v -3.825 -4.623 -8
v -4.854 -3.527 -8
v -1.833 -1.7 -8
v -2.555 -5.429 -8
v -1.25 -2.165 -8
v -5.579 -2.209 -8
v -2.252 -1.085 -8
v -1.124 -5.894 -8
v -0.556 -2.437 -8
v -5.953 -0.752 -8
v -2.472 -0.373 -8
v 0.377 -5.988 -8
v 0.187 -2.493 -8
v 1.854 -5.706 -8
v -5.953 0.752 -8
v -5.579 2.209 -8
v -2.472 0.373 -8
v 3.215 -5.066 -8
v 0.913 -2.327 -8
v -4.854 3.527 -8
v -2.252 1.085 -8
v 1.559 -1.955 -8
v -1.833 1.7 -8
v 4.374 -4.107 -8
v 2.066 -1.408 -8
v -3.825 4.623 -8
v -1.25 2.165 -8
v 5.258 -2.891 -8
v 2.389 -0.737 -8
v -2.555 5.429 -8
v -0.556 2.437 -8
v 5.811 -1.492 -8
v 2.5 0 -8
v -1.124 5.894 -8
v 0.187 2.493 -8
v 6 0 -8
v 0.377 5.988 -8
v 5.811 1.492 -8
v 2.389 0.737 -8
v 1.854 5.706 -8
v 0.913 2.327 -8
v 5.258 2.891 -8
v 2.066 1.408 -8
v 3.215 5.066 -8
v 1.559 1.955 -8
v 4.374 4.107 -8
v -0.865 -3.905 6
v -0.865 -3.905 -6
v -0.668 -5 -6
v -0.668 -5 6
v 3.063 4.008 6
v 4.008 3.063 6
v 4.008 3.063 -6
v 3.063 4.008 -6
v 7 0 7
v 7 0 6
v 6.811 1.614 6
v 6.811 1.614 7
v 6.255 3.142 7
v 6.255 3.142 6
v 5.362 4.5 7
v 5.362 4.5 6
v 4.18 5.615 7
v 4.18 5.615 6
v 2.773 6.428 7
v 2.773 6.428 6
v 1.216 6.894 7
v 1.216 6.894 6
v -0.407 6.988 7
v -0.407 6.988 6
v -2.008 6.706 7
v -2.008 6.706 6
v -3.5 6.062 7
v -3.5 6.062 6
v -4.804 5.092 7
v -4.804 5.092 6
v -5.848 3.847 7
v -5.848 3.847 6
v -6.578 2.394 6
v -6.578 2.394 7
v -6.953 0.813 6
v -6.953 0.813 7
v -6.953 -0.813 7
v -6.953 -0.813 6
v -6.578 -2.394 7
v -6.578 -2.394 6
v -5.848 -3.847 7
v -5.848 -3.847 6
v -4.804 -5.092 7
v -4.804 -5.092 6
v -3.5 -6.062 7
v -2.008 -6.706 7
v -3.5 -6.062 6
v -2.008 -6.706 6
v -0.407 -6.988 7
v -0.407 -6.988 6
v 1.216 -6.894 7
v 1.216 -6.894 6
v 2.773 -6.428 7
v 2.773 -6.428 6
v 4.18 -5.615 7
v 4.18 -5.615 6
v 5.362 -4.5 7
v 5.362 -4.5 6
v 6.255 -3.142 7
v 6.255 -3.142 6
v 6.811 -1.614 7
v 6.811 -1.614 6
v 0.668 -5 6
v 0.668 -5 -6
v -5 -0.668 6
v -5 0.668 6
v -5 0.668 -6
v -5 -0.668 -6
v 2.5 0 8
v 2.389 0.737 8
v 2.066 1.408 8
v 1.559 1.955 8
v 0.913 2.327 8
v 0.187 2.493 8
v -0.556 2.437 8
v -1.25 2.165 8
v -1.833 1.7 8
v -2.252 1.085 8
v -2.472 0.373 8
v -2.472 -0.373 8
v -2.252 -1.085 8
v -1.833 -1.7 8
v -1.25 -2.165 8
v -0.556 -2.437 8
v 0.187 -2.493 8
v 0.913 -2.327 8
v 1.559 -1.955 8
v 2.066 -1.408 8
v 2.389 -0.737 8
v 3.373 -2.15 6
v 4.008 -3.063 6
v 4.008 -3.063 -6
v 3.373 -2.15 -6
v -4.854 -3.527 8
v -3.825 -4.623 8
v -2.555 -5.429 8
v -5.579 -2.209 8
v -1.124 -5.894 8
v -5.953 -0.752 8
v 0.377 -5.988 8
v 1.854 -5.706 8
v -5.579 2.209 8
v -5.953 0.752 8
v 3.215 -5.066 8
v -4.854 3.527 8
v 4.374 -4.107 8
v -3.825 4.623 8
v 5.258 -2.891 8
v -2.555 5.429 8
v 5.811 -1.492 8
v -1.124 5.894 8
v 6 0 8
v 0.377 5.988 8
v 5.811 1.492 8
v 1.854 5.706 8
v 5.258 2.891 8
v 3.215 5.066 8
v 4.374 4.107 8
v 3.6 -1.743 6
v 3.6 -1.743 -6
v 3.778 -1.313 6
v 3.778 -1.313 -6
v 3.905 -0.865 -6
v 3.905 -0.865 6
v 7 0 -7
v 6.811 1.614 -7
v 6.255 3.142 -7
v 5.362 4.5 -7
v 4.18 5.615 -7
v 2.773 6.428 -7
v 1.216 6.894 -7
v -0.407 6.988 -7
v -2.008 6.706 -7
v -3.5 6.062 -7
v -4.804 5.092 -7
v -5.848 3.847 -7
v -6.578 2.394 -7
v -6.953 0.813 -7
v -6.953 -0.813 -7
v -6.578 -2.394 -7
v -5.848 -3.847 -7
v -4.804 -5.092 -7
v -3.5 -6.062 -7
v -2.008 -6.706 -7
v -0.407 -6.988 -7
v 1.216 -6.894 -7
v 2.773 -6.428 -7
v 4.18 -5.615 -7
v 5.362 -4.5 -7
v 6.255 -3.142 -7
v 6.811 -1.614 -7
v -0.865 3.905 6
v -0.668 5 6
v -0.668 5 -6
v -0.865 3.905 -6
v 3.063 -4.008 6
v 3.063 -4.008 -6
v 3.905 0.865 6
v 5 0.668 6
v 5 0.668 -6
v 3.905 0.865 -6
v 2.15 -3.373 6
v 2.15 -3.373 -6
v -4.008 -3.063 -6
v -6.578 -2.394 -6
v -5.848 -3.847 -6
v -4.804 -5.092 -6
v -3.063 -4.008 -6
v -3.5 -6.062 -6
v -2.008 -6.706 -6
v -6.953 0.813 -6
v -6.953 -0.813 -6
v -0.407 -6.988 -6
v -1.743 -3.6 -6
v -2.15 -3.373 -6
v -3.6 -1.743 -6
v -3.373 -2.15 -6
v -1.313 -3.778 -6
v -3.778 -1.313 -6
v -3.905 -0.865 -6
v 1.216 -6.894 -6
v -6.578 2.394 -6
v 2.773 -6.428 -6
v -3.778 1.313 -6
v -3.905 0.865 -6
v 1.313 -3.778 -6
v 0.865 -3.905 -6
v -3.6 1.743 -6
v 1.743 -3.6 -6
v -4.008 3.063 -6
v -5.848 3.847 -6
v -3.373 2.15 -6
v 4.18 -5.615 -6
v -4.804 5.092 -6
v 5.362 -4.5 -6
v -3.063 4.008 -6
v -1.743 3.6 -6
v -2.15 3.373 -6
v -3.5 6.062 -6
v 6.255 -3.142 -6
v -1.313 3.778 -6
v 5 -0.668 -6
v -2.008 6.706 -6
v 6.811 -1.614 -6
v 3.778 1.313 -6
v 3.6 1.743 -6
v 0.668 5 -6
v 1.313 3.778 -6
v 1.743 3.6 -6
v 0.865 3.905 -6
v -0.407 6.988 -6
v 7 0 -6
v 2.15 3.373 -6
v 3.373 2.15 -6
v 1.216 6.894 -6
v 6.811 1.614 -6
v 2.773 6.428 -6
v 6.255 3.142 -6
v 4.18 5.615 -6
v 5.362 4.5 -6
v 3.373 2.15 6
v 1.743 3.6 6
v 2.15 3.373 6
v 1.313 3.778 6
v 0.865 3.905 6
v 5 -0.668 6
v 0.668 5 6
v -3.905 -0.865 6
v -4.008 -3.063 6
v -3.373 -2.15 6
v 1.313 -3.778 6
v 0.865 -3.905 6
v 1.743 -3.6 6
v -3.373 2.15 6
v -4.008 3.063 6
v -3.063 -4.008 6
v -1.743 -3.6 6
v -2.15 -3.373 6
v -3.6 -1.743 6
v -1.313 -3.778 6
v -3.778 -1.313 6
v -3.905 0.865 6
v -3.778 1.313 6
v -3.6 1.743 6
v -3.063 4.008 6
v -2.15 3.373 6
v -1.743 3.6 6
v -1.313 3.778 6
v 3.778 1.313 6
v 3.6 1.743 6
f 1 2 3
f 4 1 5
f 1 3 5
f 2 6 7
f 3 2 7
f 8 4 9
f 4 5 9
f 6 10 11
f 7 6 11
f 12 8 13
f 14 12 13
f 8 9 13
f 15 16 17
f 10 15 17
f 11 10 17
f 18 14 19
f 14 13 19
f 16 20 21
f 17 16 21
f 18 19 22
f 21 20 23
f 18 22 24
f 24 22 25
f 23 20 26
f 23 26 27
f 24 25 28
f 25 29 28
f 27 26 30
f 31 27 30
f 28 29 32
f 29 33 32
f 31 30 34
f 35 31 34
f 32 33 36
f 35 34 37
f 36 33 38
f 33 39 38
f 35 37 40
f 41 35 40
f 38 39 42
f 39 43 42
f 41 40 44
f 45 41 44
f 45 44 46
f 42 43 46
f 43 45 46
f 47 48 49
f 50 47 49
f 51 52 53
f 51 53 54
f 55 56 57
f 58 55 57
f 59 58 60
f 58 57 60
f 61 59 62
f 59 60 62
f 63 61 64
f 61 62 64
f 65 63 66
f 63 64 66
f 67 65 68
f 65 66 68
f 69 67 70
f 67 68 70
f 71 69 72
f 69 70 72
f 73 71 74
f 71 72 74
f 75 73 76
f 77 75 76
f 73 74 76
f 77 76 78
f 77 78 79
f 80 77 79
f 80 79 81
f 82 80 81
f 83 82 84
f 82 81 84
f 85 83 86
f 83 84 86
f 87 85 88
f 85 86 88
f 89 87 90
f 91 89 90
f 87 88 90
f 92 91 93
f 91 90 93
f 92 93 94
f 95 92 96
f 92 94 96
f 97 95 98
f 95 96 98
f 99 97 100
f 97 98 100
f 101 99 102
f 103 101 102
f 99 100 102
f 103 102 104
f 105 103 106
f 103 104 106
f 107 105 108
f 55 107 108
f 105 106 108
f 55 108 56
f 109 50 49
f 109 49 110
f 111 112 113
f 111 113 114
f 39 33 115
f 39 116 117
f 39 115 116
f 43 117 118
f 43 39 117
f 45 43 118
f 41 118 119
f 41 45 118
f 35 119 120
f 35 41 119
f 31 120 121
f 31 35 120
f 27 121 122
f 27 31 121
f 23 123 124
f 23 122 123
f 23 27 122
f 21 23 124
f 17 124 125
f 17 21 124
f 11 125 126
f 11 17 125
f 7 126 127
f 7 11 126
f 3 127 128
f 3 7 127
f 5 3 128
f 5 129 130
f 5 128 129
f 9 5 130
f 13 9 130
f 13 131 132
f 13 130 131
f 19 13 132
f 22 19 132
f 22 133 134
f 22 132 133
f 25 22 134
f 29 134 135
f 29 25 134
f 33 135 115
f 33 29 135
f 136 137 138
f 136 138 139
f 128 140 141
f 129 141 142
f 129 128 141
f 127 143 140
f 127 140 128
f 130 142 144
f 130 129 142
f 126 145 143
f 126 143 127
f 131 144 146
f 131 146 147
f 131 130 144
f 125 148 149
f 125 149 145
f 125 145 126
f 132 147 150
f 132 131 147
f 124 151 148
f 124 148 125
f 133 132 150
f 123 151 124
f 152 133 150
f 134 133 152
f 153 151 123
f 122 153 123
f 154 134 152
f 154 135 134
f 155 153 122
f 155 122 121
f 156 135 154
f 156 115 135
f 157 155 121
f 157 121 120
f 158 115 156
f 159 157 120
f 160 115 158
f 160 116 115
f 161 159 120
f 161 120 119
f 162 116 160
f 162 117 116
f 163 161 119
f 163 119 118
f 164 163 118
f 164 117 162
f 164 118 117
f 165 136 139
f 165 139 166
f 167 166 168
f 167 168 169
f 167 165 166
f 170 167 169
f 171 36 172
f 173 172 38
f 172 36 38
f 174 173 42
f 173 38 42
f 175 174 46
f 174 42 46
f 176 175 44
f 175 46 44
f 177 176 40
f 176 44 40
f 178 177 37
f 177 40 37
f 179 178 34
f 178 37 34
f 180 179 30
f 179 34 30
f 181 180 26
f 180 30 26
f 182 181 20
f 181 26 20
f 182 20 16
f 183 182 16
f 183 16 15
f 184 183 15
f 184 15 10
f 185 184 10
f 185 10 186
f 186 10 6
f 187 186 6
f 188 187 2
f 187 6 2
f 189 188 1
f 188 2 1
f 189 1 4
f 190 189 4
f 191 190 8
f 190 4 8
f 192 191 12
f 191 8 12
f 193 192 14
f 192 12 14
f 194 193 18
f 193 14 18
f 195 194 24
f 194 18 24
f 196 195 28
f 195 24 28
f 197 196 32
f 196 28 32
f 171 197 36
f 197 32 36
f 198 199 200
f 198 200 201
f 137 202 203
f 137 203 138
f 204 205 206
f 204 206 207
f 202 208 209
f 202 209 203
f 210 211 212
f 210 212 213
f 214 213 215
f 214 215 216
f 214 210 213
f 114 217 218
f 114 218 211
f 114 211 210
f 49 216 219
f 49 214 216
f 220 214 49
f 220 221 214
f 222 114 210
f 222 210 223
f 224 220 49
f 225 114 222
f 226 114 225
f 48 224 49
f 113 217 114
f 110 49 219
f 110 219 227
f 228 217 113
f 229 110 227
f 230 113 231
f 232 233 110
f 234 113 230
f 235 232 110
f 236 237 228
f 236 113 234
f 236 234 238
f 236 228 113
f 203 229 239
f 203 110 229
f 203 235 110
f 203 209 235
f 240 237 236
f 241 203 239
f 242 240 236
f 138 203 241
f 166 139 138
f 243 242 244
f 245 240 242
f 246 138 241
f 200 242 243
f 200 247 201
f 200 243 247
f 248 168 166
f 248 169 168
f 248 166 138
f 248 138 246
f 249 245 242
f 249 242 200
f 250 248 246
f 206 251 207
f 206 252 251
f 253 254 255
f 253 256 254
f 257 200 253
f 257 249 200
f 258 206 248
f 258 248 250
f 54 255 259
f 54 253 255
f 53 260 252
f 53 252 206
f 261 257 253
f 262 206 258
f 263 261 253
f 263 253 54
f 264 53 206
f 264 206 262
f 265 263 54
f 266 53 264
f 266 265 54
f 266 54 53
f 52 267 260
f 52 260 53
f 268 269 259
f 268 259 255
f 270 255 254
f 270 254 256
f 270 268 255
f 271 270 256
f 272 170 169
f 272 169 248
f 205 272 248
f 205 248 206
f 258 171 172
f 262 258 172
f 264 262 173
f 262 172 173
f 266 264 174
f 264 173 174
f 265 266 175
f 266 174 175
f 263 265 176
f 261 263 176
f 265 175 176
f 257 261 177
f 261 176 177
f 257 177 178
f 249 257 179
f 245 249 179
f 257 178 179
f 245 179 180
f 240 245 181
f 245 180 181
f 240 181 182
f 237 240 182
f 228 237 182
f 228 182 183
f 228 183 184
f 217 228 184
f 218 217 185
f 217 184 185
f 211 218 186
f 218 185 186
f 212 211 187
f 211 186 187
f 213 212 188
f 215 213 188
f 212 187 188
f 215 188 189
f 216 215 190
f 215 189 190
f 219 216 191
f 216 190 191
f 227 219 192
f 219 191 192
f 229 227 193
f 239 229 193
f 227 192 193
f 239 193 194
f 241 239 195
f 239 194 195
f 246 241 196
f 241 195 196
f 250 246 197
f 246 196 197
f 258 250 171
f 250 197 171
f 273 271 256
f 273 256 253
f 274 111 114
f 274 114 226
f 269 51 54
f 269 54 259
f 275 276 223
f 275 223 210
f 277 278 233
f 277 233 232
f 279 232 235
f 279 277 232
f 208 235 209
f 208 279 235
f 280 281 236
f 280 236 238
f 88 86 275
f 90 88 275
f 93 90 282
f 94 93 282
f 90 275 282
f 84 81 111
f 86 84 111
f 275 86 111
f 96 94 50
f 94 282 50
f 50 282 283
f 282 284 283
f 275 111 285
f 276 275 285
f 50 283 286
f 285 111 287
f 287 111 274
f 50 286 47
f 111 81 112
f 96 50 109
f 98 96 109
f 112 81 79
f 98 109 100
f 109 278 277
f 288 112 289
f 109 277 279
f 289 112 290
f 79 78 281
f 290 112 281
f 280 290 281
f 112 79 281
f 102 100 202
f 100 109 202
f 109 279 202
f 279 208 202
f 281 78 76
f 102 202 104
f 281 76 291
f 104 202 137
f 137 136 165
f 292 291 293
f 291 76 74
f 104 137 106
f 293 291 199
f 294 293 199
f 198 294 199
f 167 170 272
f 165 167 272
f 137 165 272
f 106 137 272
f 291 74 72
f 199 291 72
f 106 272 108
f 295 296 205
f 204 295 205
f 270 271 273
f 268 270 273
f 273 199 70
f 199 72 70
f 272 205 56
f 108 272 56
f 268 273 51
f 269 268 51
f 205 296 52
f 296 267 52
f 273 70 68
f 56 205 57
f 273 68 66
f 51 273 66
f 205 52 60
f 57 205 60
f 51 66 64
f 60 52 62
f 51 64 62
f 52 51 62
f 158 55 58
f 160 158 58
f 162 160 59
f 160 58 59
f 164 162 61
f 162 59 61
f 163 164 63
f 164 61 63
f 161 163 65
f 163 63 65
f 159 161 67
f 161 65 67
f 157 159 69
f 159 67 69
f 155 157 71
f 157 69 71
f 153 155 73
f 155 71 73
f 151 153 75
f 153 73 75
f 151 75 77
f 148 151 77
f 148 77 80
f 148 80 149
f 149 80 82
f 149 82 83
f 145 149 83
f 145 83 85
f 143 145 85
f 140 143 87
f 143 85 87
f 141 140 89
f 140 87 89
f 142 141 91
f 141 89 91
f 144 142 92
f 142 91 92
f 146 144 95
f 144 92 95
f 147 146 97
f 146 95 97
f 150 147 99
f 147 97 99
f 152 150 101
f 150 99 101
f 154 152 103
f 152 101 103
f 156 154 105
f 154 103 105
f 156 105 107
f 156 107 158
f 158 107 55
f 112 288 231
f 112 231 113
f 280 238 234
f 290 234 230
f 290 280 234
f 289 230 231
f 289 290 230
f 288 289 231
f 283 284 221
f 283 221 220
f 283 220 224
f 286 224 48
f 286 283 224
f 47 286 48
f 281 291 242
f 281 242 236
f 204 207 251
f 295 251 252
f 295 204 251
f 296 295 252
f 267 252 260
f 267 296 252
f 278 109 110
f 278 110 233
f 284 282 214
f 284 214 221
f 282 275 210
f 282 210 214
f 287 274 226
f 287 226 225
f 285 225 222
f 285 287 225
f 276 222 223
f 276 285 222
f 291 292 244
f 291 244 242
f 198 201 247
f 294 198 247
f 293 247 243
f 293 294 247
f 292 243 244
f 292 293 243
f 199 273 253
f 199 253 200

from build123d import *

# Parameters (mm, degrees)
SKETCH1_R               = 4
BOSS_EXTRUDE1_DEPTH     = 6
SKETCH2_R               = 7
BOSS_EXTRUDE2_DEPTH     = 2
LPATTERN1_COUNT         = 2
LPATTERN1_PITCH         = 14
CUT_EXTRUDE1_DEPTH      = 13.727922061
CUT_EXTRUDE1_DEPTH_BACK = 13.727922061
SKETCH3_R               = 2.5
CHAMFER1_SIZE           = 1
BOSS_EXTRUDE3_DEPTH     = 6
CIRPATTERN1_COUNT       = 8


with BuildPart() as part:
    # Sketch1 → Boss-Extrude1 (new, symmetric)
    with BuildSketch(Plane.XY):
        Circle(SKETCH1_R)
    extrude(amount=BOSS_EXTRUDE1_DEPTH, both=True)

    # Sketch2 → Boss-Extrude2 (add)
    with BuildSketch(Plane.XY.offset(6)):
        Circle(SKETCH2_R)
    boss_extrude2 = extrude(amount=BOSS_EXTRUDE2_DEPTH)

    # LPattern1: Boss-Extrude2 ×2
    with Locations(*[(0, 0, -i * LPATTERN1_PITCH) for i in range(1, LPATTERN1_COUNT)]):
        add(boss_extrude2)

    # Sketch3 → Cut-Extrude1 (cut, two sides: drawn at the far end of the back side and taken through both)
    with BuildSketch(Plane.XY.offset(-CUT_EXTRUDE1_DEPTH_BACK)):
        Circle(SKETCH3_R)
    extrude(amount=CUT_EXTRUDE1_DEPTH + CUT_EXTRUDE1_DEPTH_BACK, mode=Mode.SUBTRACT)

    # Chamfer1
    chamfer1_edges = [part.edges().sort_by_distance(p)[0] for p in [
        (-7, 0, 8),
        (-7, 0, -8),
    ]]
    chamfer(chamfer1_edges, length=CHAMFER1_SIZE)

    # Sketch6 → Boss-Extrude3 (add, symmetric)
    with BuildSketch(Plane.XY):
        Polygon((1.1, 2.6), (0.668195185, 5), (-0.668195185, 5), (-1.1, 2.6), align=None)
    boss_extrude3 = extrude(amount=BOSS_EXTRUDE3_DEPTH, both=True)

    # CirPattern1: Boss-Extrude3 ×8 about axis
    cirpattern1_axis = Axis((0, 0, 0), (0, 0, 1))
    for i in range(1, CIRPATTERN1_COUNT):
        add(boss_extrude3.rotate(cirpattern1_axis, i * 360 / CIRPATTERN1_COUNT))


solid = part.part
